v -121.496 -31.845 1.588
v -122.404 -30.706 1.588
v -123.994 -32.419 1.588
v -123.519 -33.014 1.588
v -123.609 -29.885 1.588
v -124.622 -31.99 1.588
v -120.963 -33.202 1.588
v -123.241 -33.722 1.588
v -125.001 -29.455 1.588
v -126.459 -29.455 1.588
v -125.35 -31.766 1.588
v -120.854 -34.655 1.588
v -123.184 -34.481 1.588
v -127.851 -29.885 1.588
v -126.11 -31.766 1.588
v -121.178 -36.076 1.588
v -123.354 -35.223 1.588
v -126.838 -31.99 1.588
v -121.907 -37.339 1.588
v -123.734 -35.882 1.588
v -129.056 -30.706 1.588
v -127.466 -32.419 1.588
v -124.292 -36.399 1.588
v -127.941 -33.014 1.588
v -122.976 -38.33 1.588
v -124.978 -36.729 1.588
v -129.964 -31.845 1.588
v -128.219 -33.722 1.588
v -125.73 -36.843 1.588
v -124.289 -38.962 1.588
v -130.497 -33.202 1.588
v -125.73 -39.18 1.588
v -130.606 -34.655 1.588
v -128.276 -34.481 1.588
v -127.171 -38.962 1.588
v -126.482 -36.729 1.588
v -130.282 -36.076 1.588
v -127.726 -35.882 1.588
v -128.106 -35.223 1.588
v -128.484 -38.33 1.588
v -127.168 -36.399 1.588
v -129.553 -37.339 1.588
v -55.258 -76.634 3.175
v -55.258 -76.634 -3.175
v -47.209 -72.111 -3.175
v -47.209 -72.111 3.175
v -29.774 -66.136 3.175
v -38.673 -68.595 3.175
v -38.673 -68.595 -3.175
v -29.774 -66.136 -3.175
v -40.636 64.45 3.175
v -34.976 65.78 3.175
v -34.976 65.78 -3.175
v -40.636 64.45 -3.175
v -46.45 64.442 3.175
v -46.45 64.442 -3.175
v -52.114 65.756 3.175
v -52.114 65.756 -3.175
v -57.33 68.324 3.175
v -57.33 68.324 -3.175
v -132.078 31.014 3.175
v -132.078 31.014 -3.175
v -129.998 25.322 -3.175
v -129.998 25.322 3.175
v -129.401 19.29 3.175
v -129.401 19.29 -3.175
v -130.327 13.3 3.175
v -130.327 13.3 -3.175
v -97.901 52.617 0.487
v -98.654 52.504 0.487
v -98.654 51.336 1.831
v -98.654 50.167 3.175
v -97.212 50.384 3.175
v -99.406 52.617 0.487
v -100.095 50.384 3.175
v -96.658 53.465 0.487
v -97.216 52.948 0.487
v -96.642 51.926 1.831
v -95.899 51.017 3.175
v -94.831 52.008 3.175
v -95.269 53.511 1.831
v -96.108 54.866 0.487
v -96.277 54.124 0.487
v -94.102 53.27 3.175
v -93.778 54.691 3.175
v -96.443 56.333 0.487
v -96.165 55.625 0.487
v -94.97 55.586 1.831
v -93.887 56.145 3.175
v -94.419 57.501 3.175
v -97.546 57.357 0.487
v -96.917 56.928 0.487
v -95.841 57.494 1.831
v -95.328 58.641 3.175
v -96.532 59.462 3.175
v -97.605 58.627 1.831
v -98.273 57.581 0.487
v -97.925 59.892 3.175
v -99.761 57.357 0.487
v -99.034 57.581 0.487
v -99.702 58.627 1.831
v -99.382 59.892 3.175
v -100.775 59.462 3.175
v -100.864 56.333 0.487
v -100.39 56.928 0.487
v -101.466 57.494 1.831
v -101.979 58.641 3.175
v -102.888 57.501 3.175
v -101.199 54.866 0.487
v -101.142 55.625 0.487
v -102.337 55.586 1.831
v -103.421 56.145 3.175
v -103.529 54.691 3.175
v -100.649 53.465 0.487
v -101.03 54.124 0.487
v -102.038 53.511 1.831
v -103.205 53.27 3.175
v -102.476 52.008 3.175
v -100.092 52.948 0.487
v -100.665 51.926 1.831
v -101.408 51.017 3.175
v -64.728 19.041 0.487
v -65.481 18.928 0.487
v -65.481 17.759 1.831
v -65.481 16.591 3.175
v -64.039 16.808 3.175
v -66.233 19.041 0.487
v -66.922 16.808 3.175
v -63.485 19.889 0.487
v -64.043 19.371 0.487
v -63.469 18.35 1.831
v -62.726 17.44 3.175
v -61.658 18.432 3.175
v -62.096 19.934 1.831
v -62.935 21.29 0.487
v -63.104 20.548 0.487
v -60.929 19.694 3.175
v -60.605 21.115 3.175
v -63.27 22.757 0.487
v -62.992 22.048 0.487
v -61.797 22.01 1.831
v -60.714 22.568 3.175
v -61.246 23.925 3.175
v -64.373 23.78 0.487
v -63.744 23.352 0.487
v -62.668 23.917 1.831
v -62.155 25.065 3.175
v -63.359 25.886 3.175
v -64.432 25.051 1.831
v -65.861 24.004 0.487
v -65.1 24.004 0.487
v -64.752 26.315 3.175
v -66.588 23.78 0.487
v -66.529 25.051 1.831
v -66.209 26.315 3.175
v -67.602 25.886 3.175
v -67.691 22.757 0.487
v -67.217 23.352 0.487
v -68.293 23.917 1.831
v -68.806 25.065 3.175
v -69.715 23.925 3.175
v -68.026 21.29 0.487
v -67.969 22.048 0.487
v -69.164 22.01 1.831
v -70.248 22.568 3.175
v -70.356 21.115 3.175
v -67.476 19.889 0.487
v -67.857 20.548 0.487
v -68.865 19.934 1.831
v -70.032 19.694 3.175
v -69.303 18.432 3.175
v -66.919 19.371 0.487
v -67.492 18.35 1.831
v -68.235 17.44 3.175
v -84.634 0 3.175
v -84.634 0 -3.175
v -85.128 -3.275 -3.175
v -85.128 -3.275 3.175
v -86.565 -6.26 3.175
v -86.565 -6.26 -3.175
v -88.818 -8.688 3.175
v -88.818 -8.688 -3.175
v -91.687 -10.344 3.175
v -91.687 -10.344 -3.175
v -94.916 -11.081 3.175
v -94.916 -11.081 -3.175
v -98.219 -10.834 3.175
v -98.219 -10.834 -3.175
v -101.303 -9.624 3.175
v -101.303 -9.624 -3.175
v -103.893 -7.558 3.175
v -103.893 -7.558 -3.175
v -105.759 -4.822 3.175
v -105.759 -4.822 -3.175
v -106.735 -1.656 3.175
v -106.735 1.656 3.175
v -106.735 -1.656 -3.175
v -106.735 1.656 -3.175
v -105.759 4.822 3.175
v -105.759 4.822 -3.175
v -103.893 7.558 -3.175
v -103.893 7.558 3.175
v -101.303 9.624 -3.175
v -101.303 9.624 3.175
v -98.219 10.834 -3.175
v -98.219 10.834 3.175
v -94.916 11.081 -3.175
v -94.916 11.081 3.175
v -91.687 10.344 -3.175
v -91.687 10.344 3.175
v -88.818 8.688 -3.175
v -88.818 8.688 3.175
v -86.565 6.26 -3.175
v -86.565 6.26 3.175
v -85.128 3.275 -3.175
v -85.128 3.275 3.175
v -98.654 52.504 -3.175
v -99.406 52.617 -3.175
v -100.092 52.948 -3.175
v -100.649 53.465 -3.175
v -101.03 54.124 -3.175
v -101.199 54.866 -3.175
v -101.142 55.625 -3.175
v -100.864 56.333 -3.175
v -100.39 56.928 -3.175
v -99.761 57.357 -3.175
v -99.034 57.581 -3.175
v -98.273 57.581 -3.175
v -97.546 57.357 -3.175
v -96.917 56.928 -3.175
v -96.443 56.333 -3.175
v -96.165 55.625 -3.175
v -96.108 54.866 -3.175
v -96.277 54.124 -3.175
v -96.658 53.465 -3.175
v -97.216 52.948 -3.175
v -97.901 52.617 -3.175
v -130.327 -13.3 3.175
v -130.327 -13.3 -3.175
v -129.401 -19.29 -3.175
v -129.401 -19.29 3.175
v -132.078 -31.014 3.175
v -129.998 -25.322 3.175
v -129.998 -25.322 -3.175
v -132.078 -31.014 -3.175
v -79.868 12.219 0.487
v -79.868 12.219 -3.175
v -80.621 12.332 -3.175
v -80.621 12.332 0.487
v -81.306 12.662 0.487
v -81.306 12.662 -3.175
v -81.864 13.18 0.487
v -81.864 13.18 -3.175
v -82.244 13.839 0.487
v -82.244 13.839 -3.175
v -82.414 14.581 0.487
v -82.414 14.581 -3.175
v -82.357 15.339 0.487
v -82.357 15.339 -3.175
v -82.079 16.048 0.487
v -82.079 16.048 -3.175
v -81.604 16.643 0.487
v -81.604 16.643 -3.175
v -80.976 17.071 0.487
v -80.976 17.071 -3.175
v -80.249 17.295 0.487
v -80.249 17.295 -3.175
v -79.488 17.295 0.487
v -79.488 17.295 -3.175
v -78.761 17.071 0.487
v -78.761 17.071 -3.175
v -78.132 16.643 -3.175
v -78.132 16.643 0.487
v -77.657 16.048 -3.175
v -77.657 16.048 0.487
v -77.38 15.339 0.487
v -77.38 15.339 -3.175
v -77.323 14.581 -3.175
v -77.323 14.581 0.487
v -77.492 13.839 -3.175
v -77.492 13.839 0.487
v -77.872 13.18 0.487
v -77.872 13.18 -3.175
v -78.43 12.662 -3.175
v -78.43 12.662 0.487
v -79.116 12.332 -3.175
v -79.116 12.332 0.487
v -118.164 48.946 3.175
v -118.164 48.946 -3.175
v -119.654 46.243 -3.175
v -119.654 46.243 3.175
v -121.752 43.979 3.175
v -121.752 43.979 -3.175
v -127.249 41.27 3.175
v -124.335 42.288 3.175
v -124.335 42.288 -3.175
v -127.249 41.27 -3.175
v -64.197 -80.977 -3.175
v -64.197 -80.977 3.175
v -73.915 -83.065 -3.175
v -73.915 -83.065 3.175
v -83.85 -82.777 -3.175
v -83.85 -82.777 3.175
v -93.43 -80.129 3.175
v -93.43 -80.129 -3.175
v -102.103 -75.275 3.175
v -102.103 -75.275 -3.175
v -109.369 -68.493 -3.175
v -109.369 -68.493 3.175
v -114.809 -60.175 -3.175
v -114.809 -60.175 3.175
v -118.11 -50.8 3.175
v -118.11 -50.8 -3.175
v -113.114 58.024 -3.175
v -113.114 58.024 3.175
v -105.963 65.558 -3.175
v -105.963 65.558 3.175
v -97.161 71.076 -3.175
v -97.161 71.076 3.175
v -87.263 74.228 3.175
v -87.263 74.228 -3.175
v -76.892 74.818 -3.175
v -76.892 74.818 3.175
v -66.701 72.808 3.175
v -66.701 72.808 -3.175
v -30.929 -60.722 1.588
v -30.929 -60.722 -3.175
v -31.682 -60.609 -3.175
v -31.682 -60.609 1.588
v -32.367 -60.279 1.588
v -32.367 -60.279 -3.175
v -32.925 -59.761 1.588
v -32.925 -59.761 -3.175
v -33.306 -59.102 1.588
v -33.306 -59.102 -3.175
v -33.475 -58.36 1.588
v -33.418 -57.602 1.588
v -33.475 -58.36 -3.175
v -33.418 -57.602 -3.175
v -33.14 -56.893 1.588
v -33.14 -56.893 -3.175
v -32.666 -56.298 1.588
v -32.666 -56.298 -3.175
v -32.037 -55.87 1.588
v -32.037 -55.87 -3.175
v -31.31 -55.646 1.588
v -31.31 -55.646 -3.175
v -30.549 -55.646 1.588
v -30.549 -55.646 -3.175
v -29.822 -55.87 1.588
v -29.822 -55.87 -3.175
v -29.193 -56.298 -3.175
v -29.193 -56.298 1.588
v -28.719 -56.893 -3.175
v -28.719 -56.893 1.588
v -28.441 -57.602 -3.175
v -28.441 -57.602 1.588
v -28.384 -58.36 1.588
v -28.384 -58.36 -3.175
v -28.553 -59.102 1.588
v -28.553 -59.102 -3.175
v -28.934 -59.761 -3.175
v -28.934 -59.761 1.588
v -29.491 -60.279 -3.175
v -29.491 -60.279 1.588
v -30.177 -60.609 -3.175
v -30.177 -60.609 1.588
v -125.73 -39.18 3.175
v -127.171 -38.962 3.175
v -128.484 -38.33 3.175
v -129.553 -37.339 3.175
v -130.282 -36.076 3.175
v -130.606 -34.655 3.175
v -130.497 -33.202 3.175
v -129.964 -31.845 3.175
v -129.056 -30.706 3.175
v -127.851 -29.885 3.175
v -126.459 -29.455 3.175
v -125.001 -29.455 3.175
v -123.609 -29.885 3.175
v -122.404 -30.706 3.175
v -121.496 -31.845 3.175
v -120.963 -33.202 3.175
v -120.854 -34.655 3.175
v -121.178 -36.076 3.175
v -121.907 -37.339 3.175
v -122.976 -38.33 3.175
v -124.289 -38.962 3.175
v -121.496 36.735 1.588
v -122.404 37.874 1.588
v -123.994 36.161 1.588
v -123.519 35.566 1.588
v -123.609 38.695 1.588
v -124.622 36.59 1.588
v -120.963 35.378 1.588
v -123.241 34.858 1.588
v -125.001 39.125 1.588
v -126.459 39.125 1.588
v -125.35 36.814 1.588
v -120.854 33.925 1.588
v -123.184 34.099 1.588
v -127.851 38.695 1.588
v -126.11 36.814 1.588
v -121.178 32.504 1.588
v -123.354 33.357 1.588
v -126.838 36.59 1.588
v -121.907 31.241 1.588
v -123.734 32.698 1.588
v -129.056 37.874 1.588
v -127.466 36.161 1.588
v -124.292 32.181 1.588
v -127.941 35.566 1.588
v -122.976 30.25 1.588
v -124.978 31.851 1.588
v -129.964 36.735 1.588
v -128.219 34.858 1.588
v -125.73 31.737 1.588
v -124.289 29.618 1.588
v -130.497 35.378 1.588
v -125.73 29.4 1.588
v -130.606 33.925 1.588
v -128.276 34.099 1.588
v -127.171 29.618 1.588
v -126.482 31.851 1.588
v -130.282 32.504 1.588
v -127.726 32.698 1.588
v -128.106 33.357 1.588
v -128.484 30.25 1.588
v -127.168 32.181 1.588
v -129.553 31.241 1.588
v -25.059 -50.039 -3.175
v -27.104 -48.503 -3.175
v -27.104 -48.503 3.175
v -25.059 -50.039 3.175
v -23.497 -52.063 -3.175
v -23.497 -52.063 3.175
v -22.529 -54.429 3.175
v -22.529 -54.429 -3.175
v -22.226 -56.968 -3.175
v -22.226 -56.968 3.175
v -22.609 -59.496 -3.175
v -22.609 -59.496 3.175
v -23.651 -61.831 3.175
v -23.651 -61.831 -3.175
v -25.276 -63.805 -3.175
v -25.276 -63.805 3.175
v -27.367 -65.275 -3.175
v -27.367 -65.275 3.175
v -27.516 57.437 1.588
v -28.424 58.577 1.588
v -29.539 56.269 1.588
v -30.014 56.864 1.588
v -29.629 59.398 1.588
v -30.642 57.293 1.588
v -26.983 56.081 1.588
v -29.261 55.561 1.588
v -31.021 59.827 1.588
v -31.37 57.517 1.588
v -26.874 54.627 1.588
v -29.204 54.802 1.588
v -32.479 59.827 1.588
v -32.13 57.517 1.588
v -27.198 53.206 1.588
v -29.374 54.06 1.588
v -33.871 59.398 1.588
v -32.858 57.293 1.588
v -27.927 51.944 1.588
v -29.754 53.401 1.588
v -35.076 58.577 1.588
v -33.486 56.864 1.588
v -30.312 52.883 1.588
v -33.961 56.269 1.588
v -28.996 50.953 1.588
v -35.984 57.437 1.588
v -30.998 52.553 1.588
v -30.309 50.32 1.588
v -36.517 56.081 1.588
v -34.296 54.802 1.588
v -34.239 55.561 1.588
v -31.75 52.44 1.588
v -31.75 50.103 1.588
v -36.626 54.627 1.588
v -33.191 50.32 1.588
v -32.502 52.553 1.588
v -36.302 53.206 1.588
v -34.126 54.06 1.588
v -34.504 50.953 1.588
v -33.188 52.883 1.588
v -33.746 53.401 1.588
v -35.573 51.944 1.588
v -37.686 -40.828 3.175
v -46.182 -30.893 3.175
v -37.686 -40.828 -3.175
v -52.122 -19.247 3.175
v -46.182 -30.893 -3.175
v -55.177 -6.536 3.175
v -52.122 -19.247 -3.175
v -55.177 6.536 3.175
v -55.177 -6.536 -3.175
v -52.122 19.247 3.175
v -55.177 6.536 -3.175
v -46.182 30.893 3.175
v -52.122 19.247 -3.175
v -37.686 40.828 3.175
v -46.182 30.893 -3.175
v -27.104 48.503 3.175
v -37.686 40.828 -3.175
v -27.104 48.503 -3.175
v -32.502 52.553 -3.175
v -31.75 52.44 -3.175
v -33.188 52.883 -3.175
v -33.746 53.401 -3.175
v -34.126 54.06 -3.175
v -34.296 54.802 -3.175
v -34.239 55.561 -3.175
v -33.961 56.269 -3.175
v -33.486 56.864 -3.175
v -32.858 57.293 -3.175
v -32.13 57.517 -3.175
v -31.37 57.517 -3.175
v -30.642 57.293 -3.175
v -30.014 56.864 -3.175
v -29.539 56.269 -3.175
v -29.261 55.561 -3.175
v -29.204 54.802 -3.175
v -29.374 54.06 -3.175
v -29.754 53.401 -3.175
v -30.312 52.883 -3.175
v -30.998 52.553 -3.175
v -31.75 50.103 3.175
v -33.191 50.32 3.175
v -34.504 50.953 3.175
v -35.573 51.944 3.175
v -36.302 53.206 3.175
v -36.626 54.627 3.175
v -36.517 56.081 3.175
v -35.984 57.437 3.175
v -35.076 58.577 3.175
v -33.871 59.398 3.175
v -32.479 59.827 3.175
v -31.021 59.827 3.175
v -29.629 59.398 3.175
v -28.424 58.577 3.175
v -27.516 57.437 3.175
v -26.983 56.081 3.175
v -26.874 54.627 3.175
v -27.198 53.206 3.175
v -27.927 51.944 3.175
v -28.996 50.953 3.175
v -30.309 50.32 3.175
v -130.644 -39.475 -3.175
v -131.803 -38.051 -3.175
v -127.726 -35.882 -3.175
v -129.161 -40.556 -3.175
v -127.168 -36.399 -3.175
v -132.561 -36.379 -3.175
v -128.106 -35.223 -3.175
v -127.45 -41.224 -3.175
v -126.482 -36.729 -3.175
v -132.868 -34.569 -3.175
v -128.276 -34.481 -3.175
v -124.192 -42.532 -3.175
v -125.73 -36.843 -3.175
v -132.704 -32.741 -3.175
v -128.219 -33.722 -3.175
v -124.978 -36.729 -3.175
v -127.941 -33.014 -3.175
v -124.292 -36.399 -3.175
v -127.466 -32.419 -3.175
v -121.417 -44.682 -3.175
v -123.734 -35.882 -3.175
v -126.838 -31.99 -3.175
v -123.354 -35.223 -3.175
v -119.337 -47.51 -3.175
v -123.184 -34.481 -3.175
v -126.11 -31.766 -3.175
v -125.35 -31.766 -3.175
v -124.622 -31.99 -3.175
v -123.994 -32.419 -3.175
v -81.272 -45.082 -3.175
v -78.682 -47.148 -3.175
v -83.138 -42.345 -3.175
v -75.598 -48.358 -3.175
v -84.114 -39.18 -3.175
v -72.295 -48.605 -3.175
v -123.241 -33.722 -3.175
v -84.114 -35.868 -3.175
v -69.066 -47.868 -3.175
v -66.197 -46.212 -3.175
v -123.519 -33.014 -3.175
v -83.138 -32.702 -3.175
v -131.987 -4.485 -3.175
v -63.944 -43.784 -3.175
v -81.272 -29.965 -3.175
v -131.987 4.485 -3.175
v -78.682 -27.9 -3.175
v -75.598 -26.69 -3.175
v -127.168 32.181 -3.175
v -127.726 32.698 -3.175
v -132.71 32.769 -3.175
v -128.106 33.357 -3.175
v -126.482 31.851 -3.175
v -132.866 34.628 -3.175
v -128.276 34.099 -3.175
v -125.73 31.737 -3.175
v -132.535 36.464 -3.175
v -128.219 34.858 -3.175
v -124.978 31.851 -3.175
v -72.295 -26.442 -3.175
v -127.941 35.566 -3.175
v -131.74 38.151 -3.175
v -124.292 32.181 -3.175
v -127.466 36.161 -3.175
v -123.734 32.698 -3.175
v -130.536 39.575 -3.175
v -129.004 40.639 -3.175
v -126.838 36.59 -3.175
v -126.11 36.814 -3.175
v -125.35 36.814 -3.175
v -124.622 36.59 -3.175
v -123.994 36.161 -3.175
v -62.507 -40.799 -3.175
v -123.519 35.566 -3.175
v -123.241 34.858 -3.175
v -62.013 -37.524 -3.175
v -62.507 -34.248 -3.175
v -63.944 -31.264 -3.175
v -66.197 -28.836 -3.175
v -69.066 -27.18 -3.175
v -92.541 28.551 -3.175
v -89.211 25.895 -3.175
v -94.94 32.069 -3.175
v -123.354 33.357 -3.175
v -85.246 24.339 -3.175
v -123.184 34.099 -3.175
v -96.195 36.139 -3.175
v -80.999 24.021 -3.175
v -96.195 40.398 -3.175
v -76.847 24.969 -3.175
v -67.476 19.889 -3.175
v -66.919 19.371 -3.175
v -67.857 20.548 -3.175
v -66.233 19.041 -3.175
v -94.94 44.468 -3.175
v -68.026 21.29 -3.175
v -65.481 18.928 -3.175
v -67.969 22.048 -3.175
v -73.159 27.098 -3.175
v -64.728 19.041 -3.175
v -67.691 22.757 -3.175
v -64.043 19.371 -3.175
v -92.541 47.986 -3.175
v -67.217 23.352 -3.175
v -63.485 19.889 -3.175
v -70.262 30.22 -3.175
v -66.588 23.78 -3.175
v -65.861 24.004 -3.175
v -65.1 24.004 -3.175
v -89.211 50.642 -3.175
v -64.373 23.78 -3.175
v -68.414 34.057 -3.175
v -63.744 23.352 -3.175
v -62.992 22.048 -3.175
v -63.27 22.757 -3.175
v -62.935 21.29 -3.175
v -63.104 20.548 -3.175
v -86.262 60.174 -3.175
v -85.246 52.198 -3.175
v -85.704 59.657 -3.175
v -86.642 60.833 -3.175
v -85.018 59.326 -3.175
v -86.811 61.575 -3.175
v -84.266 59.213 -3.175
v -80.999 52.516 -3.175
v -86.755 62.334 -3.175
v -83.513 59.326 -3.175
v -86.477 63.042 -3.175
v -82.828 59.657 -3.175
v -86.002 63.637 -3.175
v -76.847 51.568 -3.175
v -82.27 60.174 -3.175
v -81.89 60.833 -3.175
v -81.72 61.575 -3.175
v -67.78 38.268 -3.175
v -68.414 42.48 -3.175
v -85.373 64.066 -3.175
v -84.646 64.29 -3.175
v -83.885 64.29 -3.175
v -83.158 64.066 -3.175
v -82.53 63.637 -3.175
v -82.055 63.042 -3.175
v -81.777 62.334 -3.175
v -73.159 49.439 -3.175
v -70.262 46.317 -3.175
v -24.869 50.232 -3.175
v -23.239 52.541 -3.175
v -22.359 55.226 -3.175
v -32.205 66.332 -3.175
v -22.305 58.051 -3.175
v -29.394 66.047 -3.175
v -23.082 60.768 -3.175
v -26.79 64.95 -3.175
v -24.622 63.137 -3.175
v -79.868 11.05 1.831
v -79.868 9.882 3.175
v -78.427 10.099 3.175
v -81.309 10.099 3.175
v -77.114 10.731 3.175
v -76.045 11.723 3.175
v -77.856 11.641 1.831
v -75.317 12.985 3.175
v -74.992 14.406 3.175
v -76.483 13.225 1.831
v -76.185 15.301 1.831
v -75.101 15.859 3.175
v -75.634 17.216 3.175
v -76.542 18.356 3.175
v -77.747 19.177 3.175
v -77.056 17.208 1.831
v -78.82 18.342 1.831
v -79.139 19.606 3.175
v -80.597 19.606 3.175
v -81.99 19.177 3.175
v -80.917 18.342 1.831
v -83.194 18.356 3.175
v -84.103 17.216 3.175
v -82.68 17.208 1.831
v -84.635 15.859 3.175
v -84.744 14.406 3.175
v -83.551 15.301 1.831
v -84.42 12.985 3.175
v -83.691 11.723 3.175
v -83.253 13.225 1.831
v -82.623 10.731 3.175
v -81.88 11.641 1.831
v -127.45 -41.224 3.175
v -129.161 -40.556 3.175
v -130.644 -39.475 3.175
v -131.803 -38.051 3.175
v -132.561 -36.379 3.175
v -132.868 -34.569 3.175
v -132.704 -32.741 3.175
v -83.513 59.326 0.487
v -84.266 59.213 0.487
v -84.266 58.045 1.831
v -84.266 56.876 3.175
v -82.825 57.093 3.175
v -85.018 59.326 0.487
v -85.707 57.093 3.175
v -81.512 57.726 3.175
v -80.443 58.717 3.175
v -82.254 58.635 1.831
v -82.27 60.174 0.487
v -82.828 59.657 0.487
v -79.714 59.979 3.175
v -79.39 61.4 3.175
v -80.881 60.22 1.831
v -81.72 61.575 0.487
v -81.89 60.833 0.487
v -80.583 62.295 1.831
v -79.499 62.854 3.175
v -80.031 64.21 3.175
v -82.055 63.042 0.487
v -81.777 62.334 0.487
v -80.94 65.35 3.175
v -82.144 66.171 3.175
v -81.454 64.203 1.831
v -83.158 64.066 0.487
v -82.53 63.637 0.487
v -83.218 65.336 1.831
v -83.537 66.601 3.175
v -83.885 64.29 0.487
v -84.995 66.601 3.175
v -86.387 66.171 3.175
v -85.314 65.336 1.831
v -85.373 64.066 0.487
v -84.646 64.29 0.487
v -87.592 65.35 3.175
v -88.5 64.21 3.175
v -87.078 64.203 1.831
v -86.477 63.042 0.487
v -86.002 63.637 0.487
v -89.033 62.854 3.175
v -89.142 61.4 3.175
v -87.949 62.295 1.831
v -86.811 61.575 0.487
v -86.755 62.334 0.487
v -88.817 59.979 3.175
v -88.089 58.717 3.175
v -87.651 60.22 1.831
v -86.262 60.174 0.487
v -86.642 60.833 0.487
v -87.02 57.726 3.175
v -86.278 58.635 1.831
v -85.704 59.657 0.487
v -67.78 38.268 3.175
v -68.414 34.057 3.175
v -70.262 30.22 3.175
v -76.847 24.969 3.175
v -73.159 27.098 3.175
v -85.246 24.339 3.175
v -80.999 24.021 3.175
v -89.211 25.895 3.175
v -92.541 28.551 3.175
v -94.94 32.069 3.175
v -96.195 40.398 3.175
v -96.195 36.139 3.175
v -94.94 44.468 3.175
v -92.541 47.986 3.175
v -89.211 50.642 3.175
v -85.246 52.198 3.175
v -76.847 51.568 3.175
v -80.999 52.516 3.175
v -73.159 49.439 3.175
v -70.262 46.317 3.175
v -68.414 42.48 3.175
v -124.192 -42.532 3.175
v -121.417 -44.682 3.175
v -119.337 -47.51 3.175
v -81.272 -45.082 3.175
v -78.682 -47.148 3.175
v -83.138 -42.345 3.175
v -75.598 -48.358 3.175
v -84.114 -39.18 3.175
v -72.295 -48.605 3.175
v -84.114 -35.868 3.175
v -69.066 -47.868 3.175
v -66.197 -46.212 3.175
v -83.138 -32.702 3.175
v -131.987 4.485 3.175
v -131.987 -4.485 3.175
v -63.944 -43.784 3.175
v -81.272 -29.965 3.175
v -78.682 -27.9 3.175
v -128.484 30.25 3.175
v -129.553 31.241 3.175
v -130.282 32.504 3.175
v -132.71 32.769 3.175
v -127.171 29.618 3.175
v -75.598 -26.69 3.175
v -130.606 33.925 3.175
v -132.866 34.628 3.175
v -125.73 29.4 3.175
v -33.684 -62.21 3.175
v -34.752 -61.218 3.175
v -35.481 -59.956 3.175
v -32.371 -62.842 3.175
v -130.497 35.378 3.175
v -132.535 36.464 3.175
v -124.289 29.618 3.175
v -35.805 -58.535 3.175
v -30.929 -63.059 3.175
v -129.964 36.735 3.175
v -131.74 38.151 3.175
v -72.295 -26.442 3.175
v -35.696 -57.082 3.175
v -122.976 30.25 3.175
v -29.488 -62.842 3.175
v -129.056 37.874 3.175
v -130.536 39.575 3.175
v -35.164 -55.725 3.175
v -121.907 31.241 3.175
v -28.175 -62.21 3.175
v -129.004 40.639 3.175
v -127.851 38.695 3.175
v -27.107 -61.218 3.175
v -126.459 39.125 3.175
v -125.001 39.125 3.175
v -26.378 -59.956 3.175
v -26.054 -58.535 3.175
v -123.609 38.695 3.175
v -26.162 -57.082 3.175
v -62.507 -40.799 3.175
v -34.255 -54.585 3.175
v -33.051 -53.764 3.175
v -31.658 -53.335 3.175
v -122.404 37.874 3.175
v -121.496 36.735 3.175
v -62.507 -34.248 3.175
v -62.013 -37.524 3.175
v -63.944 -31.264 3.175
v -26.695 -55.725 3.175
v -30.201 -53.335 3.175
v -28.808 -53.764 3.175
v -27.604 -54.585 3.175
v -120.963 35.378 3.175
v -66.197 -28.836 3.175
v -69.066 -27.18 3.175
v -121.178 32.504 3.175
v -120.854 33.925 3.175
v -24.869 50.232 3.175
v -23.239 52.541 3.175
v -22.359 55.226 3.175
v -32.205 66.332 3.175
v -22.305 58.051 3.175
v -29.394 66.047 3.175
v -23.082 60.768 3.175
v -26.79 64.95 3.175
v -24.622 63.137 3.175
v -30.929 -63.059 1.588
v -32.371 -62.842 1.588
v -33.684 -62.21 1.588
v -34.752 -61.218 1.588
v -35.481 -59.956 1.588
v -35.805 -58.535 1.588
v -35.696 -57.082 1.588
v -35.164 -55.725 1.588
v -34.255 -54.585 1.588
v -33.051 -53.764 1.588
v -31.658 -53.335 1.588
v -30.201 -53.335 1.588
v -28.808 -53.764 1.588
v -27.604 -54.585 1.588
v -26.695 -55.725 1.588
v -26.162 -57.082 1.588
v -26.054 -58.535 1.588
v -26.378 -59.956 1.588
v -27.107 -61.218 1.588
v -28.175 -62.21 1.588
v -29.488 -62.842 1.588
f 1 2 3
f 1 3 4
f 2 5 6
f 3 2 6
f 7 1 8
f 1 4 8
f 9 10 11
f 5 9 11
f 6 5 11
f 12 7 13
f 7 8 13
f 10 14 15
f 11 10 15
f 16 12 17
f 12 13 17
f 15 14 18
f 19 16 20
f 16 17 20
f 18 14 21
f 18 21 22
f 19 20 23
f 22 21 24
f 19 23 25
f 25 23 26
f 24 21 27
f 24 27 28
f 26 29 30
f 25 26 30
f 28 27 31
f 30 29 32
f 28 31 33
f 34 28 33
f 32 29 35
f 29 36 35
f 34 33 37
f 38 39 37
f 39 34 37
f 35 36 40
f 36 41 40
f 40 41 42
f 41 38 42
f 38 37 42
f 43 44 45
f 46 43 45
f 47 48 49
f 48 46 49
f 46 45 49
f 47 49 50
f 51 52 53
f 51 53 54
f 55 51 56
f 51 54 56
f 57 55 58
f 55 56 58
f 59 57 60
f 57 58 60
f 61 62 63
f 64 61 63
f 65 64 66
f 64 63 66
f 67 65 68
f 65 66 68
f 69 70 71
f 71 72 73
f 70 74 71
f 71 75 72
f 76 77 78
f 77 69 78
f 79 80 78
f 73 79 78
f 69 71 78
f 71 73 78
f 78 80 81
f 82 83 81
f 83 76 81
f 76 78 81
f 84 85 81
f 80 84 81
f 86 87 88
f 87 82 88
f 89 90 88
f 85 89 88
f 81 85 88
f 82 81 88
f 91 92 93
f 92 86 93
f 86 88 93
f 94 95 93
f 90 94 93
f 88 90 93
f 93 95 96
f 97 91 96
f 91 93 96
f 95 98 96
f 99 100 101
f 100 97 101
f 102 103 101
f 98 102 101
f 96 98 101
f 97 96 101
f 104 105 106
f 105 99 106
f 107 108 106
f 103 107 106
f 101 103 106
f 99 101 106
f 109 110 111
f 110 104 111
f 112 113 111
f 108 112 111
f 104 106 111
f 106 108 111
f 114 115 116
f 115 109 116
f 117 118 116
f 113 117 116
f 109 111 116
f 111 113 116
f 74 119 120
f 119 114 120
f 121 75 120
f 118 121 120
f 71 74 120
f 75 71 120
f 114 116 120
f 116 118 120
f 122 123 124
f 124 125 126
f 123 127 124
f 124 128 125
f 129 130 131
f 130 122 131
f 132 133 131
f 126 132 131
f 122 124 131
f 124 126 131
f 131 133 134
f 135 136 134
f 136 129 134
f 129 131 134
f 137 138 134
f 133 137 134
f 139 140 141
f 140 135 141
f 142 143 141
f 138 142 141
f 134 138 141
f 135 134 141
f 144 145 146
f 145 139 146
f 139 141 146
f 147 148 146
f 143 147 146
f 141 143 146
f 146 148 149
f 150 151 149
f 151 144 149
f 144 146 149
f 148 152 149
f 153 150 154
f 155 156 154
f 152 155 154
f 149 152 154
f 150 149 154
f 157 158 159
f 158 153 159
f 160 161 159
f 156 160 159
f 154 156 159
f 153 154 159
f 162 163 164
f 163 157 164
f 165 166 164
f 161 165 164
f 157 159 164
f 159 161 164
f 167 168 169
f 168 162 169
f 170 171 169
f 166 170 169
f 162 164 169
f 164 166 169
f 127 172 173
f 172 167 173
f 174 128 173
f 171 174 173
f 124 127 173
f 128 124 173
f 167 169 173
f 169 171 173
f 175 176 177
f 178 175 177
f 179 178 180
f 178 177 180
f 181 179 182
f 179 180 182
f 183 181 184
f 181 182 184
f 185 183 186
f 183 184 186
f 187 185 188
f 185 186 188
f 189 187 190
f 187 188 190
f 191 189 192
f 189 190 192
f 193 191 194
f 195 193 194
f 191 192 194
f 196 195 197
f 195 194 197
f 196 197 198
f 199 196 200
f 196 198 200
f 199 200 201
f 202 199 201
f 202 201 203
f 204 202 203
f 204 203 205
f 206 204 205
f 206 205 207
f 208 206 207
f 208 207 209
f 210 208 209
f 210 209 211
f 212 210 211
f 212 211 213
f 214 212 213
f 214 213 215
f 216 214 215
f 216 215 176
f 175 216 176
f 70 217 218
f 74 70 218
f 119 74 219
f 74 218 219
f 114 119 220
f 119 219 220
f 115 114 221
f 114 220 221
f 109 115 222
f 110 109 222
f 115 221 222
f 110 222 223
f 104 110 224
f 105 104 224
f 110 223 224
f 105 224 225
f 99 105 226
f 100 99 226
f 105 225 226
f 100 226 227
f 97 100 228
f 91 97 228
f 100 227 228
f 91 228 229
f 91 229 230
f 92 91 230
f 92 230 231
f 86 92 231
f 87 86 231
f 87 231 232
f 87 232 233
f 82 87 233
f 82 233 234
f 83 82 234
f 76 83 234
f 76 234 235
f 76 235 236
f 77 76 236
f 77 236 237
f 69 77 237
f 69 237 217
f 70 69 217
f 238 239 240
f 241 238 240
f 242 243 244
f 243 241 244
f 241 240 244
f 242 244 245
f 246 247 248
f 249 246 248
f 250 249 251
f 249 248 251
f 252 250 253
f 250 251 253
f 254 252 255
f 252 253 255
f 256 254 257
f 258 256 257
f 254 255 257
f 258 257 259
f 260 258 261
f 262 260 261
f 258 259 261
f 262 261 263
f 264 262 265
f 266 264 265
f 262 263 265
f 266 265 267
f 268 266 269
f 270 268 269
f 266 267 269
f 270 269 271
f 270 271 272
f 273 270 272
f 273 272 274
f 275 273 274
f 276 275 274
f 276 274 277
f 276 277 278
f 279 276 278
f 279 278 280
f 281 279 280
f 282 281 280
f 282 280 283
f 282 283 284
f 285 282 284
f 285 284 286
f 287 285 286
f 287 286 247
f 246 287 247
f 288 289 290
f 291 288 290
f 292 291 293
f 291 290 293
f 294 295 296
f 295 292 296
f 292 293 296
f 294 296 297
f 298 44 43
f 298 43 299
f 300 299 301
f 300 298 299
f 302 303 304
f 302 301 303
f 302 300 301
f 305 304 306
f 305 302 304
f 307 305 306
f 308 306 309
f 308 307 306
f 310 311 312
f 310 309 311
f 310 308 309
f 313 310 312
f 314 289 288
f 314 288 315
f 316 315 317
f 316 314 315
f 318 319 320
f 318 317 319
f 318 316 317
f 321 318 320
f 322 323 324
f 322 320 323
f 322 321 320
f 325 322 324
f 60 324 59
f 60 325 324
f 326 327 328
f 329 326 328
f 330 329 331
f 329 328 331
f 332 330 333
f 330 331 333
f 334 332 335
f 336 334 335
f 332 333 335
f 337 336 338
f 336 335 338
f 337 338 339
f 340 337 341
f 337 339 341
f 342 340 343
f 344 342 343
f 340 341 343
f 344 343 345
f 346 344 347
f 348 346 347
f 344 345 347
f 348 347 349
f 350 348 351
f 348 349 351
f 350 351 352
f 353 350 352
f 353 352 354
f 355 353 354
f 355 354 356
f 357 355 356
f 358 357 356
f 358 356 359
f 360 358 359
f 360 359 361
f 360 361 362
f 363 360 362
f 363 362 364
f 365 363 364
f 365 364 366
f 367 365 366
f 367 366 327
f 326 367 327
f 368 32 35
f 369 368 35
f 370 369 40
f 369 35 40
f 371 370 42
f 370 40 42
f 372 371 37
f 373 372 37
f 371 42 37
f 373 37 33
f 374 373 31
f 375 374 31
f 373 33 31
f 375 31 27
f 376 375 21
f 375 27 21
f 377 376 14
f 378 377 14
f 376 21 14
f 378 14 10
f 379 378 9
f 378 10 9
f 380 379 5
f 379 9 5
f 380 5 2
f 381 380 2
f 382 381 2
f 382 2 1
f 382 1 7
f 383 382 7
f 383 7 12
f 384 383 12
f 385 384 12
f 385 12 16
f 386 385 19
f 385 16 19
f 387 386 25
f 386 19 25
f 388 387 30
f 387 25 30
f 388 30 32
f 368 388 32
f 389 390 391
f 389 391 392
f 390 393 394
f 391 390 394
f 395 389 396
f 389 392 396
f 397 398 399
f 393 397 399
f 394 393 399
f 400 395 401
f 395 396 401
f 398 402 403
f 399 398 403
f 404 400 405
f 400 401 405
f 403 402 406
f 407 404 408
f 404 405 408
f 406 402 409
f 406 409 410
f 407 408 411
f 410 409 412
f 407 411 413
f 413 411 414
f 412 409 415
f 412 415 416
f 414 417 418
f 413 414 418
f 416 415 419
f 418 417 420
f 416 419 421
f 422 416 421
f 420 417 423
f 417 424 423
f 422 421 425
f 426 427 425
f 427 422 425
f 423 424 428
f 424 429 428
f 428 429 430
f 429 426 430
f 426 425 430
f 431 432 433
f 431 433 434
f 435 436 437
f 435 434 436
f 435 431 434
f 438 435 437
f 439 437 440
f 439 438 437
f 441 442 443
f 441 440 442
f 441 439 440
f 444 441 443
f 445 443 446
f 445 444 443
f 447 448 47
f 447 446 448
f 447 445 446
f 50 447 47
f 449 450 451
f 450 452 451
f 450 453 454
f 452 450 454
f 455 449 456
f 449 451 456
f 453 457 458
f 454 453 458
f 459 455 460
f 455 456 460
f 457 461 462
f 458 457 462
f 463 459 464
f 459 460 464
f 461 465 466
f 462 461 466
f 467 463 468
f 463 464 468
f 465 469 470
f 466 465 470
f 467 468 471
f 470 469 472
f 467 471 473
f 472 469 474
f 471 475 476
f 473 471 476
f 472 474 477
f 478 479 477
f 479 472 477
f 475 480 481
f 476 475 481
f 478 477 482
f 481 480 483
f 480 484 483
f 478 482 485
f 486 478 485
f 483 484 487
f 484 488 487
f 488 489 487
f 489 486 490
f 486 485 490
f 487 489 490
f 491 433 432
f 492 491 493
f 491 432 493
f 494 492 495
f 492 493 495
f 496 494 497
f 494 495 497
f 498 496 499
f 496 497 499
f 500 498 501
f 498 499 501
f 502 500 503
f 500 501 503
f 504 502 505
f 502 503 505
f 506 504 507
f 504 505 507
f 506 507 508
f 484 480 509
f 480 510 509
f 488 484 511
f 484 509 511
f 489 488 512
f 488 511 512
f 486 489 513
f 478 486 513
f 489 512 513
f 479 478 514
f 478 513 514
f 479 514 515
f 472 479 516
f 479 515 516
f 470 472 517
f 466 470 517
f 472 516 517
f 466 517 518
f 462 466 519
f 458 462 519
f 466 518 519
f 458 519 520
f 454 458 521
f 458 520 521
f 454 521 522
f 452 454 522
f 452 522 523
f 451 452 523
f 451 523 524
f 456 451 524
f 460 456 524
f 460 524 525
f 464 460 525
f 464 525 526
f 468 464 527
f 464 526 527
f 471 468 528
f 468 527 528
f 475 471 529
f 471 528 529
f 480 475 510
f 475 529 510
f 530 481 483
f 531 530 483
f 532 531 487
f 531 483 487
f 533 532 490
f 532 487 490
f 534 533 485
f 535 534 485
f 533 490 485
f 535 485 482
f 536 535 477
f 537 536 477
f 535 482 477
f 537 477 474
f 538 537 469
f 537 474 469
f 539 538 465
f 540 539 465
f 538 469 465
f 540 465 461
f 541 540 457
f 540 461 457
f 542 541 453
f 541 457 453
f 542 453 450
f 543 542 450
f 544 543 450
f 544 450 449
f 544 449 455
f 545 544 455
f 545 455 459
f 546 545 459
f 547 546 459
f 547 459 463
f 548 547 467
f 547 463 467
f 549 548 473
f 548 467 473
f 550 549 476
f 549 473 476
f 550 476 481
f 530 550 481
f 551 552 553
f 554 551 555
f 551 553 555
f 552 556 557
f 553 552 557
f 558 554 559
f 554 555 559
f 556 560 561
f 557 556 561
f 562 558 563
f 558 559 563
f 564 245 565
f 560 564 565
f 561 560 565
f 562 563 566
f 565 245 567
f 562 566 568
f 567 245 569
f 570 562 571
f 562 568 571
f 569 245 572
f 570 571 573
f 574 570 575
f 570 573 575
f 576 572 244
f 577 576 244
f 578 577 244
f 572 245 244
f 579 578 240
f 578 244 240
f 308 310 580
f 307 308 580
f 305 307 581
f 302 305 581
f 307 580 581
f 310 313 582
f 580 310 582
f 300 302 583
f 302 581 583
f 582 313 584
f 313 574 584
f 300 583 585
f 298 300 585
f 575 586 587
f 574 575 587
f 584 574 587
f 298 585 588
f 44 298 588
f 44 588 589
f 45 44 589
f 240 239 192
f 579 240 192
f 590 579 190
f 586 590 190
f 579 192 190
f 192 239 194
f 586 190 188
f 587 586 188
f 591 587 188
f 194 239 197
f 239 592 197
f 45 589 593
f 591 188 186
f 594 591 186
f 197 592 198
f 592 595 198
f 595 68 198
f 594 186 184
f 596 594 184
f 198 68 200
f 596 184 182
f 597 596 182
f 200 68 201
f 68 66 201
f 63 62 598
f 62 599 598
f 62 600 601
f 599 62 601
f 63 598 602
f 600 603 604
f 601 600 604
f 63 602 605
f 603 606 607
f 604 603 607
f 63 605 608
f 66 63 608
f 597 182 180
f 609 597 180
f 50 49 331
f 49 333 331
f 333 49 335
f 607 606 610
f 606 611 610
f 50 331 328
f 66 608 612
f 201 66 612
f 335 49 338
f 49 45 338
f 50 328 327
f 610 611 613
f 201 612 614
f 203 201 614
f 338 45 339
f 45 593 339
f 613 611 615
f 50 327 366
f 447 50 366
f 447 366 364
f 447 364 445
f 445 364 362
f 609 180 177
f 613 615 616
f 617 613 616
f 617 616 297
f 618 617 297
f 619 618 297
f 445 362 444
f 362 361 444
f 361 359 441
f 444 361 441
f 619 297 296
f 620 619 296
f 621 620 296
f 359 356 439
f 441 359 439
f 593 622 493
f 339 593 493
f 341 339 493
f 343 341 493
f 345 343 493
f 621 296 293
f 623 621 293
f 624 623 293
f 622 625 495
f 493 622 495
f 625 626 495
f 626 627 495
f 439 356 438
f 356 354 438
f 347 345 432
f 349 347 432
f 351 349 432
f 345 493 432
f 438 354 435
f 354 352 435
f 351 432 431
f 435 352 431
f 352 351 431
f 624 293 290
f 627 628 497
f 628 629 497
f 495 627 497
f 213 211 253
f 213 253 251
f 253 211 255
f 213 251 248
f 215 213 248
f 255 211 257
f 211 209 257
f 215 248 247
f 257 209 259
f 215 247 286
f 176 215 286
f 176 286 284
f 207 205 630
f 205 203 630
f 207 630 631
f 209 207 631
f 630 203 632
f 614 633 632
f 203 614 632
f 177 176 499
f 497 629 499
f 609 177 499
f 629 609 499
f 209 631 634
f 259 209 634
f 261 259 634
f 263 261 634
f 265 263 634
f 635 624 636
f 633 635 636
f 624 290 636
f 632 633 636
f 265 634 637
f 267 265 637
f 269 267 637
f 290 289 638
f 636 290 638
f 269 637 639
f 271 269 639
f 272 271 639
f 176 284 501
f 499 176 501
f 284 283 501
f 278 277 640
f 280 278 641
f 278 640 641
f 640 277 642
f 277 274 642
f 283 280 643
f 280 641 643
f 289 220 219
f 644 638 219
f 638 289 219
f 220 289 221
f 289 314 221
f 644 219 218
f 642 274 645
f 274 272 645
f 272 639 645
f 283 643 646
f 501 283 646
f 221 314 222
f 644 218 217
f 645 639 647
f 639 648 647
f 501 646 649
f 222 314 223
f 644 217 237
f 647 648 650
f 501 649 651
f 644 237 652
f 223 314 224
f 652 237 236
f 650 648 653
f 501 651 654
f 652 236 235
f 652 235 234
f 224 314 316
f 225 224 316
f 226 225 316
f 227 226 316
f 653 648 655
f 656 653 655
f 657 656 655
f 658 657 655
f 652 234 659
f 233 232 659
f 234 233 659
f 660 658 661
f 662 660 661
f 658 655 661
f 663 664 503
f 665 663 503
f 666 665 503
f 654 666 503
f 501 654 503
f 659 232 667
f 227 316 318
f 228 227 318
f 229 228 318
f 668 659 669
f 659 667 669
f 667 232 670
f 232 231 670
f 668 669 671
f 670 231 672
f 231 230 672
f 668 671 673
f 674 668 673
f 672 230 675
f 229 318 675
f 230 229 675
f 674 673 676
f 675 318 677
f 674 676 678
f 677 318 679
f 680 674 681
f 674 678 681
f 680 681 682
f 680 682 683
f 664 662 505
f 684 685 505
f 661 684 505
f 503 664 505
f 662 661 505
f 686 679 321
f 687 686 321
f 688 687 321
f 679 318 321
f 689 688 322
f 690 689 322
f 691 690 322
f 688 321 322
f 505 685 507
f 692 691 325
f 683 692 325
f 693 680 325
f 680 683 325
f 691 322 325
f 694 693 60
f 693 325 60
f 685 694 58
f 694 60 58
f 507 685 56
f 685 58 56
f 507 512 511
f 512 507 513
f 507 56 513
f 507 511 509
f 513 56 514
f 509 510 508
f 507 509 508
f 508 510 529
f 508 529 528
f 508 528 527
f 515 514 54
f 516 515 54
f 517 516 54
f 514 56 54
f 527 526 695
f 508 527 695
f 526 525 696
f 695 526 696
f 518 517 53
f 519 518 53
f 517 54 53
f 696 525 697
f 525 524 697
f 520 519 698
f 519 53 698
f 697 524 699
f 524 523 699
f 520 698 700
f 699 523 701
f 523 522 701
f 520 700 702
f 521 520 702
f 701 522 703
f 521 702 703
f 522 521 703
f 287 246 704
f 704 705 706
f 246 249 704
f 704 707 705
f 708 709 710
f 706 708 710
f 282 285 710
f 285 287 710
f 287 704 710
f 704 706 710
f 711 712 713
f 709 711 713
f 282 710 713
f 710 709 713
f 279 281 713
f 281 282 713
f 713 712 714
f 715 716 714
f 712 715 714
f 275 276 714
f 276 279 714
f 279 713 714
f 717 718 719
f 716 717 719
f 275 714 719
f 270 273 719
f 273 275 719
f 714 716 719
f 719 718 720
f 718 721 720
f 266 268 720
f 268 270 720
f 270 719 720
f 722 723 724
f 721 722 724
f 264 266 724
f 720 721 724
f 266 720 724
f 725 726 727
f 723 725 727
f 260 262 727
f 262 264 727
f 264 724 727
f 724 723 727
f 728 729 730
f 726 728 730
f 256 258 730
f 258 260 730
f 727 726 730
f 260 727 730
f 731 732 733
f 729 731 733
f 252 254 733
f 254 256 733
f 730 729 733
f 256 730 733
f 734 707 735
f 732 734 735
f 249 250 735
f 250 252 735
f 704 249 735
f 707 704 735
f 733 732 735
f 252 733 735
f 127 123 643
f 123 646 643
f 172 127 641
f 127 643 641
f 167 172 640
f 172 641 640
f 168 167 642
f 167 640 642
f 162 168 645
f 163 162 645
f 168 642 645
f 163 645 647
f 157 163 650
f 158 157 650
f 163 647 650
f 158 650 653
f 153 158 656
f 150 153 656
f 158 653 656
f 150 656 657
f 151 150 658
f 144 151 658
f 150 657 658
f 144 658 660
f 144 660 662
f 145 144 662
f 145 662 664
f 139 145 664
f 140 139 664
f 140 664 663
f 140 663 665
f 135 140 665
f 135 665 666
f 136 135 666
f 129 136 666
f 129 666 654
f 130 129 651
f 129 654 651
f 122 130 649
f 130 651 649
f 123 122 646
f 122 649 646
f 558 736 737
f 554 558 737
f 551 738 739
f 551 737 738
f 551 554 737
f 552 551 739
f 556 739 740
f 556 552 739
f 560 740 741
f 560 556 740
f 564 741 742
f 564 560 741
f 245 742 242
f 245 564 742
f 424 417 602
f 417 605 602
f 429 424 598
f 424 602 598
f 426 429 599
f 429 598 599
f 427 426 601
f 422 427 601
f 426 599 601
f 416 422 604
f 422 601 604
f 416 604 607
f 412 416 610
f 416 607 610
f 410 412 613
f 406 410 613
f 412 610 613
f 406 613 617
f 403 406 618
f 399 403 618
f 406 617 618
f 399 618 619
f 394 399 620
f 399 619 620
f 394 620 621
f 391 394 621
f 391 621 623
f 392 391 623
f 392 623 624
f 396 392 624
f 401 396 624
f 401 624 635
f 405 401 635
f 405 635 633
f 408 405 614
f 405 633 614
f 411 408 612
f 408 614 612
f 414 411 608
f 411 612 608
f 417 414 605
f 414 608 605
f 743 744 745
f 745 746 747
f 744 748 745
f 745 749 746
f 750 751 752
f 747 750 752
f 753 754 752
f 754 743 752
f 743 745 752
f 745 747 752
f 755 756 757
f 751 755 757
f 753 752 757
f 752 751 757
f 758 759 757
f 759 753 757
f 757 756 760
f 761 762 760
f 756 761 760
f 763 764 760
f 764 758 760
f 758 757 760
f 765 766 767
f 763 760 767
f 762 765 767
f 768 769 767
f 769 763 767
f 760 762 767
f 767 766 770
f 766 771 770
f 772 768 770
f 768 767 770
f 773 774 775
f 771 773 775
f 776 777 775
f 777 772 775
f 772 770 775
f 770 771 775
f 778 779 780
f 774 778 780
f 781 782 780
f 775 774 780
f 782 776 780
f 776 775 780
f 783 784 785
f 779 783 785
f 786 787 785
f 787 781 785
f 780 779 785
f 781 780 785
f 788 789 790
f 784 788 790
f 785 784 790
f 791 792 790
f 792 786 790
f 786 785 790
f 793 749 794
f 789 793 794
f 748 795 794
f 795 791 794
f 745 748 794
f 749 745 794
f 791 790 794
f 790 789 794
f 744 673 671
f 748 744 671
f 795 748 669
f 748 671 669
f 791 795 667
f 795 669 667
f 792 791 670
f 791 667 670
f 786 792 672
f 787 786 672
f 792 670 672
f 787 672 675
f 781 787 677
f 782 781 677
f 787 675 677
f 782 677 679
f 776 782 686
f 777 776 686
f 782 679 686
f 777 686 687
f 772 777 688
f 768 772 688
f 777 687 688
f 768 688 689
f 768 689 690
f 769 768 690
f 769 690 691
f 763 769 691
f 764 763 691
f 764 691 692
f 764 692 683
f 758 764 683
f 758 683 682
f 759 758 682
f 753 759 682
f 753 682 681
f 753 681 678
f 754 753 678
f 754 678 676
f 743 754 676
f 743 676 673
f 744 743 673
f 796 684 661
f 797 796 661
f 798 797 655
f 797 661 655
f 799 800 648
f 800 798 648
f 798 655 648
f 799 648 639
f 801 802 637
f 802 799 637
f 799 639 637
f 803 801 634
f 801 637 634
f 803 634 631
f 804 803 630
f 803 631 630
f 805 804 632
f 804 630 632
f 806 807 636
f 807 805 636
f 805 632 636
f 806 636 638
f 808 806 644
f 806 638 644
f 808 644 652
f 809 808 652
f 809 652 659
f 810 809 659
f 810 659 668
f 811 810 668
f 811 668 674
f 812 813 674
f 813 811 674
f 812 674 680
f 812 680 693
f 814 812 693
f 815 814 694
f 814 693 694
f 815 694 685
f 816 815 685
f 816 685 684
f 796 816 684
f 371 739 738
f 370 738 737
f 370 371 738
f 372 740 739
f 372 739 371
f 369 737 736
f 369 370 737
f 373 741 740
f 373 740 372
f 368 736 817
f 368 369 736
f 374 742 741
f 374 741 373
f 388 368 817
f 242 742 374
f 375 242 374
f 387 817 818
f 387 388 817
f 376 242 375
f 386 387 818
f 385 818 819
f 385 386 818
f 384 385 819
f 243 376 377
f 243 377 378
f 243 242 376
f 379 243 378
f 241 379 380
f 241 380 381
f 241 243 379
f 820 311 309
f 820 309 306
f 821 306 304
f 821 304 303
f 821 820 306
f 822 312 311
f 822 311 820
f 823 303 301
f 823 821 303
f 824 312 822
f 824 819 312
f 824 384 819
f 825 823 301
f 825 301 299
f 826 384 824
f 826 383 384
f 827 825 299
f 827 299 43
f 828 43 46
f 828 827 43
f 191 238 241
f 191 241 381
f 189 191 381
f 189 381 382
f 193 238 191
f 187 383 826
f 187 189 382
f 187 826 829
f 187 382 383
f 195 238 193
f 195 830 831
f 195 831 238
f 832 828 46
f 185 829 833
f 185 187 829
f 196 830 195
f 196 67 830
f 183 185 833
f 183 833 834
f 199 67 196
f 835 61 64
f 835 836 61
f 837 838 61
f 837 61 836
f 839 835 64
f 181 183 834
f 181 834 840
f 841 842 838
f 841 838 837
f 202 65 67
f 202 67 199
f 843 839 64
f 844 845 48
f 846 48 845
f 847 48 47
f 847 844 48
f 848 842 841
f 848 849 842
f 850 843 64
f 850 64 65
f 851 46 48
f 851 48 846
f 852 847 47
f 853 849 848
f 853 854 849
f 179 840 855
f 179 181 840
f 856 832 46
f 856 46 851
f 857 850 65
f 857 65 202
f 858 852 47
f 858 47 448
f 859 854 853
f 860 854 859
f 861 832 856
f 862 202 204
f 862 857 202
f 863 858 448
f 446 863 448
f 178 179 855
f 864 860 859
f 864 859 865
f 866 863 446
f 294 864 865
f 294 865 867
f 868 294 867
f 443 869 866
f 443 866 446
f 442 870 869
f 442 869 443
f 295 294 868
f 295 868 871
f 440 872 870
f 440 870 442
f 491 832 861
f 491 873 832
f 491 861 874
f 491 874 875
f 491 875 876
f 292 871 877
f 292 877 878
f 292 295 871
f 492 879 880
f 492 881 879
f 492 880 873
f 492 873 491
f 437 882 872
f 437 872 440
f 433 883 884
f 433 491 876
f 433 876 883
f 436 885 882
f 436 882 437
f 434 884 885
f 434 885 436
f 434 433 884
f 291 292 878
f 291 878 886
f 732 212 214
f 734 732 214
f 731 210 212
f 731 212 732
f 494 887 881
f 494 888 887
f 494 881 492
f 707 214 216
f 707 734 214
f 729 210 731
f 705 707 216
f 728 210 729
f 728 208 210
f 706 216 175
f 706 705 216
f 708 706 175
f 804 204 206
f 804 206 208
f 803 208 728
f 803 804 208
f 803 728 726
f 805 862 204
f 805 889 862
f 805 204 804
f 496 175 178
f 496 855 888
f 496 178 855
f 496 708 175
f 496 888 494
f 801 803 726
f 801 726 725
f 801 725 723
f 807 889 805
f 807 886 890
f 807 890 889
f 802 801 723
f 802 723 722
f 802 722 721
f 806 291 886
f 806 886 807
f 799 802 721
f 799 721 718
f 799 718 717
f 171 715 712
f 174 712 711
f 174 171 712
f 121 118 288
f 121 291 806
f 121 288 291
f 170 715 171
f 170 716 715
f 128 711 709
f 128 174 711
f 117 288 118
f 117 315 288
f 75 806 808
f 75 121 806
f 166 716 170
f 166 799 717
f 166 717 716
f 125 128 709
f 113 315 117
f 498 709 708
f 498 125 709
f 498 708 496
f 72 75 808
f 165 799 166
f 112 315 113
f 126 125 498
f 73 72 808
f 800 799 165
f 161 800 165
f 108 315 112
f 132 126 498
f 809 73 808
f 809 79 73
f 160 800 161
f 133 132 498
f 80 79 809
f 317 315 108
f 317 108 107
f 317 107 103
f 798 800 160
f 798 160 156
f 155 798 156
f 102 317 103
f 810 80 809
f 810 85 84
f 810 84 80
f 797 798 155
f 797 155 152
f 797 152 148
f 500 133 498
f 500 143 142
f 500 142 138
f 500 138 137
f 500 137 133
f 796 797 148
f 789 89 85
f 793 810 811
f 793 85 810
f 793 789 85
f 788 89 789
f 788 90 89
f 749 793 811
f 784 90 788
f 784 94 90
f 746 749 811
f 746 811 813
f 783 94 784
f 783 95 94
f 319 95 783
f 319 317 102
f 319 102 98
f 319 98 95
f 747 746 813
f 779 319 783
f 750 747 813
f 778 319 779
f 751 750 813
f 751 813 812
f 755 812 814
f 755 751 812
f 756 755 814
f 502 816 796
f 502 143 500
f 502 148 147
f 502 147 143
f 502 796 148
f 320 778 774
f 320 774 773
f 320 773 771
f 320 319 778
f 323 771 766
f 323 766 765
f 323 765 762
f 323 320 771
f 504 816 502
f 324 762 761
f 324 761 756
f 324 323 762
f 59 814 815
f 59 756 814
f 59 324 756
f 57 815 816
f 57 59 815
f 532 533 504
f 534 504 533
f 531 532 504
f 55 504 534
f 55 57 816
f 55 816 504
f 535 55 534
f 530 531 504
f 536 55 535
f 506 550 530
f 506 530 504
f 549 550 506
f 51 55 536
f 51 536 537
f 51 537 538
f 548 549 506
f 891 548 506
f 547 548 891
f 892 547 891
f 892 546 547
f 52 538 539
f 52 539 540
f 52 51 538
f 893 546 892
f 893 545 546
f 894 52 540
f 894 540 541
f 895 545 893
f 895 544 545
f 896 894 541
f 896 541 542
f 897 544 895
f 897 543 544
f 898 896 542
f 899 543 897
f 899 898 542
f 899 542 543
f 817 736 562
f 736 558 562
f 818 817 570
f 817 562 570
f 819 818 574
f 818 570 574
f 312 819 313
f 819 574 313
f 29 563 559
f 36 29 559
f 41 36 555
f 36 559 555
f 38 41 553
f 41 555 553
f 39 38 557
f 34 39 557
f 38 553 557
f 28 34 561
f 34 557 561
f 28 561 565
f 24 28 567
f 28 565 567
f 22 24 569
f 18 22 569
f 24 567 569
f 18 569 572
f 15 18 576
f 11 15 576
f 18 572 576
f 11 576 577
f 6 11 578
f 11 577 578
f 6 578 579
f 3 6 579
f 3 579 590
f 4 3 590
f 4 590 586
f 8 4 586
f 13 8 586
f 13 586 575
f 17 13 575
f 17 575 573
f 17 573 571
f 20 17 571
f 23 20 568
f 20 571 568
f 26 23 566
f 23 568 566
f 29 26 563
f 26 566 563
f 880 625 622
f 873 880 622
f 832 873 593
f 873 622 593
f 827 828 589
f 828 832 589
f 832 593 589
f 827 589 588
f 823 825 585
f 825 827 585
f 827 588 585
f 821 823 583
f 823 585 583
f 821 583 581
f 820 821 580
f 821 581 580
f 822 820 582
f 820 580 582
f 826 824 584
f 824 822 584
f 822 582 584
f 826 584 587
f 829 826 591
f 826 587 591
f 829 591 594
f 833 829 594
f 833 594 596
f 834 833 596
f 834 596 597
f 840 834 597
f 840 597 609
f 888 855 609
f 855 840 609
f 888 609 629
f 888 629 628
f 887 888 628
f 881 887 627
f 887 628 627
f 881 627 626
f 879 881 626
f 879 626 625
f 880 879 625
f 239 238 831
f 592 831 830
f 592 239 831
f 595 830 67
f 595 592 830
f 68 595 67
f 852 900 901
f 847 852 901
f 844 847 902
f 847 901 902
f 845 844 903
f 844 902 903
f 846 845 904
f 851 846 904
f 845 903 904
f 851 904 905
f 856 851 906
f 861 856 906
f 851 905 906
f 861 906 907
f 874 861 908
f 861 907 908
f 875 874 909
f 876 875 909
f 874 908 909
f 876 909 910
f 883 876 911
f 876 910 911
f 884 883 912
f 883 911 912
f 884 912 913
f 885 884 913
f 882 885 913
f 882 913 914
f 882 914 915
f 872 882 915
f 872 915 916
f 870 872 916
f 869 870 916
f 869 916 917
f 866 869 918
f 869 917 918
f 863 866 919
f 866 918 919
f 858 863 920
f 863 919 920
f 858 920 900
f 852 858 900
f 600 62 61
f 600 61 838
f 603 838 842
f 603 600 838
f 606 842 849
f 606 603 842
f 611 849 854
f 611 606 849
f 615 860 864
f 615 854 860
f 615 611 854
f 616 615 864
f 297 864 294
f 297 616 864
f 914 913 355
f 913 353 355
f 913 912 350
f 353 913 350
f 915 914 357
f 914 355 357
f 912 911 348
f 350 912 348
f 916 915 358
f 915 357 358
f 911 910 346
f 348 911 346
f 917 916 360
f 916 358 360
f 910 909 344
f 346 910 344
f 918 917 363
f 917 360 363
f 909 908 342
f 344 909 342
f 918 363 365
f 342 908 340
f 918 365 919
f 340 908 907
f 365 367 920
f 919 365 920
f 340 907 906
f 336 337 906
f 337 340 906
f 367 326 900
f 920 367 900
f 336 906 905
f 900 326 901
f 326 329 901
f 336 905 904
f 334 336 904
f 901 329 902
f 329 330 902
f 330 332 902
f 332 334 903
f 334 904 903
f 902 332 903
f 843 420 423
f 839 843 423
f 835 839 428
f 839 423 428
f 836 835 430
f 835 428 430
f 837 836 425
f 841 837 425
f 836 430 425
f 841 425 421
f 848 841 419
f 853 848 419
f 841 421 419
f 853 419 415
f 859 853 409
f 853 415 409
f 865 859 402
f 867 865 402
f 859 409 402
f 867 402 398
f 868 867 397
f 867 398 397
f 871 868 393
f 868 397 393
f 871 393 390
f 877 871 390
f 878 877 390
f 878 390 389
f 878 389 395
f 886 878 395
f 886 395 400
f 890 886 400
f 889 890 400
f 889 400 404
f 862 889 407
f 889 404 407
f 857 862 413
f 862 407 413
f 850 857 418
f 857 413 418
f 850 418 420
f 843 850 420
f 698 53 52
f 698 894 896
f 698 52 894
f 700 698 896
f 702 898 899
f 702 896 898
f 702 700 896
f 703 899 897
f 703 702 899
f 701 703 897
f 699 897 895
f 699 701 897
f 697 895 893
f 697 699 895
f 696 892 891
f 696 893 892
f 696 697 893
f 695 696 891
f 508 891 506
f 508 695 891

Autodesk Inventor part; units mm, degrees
ref_plane "YZ Plane" through (0, 0, 0) normal (1, 0, 0) x (0, 1, 0)
ref_plane "XZ Plane" through (0, 0, 0) normal (0, 1, 0) x (-1, 0, 0)
ref_plane "XY Plane" through (0, 0, 0) normal (0, 0, 1) x (1, 0, 0)
sketch "Sketch1" plane through (0, 0, 0) normal (0, 0, 1) x (1, 0, 0)
  circle A0 centre (0, 0) radius 53.975 construction
  circle A1 centre (-95.7467, 0) radius 11.1125
  circle A2 centre (-73.1257, -37.5239) radius 11.1125
  line L0 (-195.0218, 0) -> (95.4745, 0) projected
  line L1 (0, -186.751) -> (0, 135.7508) projected
  circle A3 centre (-82.0671, 38.2685) radius 14.2875
  arc A4 (-27.1037, 48.5034) -> (-27.1037, -48.5034) centre (0, 0) ccw
  arc A5 (-27.1037, 48.5034) -> (-34.976, 65.7804) centre (-31.75, 56.8183) ccw
  circle A6 centre (-95.7467, 0) radius 33.02 construction
  arc A7 (-57.3305, 68.3238) -> (-118.1642, 48.9464) centre (-79.7457, 33.5145) ccw
  arc A8 (-57.3305, 68.3238) -> (-34.976, 65.7804) centre (-43.5788, 89.6792) ccw
  arc A9 (-29.7745, -66.1362) -> (-27.1037, -48.5034) centre (-31.75, -56.8183) ccw
  arc A10 (-118.11, -50.8) -> (-55.2575, -76.6338) centre (-77.6901, -41.8358) ccw
  arc A11 (-29.7745, -66.1362) -> (-55.2575, -76.6338) centre (-13.9704, -140.6793) ccw
  circle A12 centre (-82.0671, 38.2685) radius 33.02 construction
  circle A13 centre (-73.1257, -37.5239) radius 39.37 construction
  circle A14 centre (-95.7467, 0) radius 10.16 construction
  circle A15 centre (0, 0) radius 16.51 construction
  circle A16 centre (-73.1257, -37.5239) radius 16.51 construction
  line L2 (0, 0) -> (-82.0671, 38.2685) construction
  circle A17 centre (-125.73, 34.29) radius 6.35 construction
  circle A18 centre (-125.73, -34.29) radius 6.35 construction
  line L3 (0, 0) -> (-34.976, 65.7804) construction
  line L4 (0, 0) -> (-57.3305, 68.3238) construction
  arc A19 (-127.2489, 41.2704) -> (-132.0785, 31.0144) centre (-125.73, 34.29) ccw
  arc A20 (-130.3268, 13.3001) -> (-130.3268, -13.3001) centre (-83.9357, 0) ccw
  arc A21 (-130.3268, 13.3001) -> (-132.0785, 31.0144) centre (-153.5223, 19.9501) ccw
  arc A22 (-132.0785, -31.0144) -> (-127.4503, -41.2235) centre (-125.73, -34.29) ccw
  arc A23 (-132.0785, -31.0144) -> (-130.3268, -13.3001) centre (-153.5223, -19.9501) ccw
  arc A24 (-118.11, -50.8) -> (-127.4503, -41.2235) centre (-130.5087, -53.5498) ccw
  arc A25 (-127.2489, 41.2704) -> (-118.1642, 48.9464) centre (-129.949, 53.6801) ccw
  line L5 (-118.1642, 48.9464) -> (0, 48.9464) construction
  line L6 (-118.11, -50.8) -> (0, -50.8) construction
  dimension "d0" = 107.95
  dimension "d9" = 22.225
  dimension "d38" = 28.575
  dimension "d63" = 1.5875
  dimension "d66" = 9.525
  dimension "d77" = 31.75
  dimension "d93" = 66.04
  dimension "d95" = 25.4
  dimension "d106" = 66.04
  dimension "d107" = 78.74
  dimension "d108" = 20.32
  dimension "d110" = 33.02
  dimension "d116" = 43.815
  dimension "d117" = 40.64
  dimension "d118" = 33.02
  dimension "d119" = 22.225
  dimension "d120" = 65
  dimension "d121" = 90.551
  dimension "d125" = 12.7
  dimension "d126" = 12.7
  dimension "d128" = 28
  dimension "d129" = 40
  dimension "d130" = 34.29
  dimension "d131" = 125.73
  dimension "d133" = 34.29
  dimension "d134" = 125.73
  dimension "d141" = 14.2875
  dimension "d144" = 14.2875
  dimension "d145" = 11.811
  dimension "d146" = 24.13
  dimension "d147" = 24.13
  dimension "d150" = 48.26
  dimension "d151" = 12.7
  dimension "d152" = 12.7
  dimension "d153" = 41.402
  dimension "d155" = 76.2
  dimension "d156" = 31.75
  dimension "d157" = 9.525
  dimension "d158" = 118.11
  dimension "d159" = 50.8
extrude "Base" add sketch "Sketch1" along normal mid plane 6.35 contours L0 A4 A9 A11 A10 A24 A22 A23 A20 A1 | A1 L0 A20 A21 A19 A25 A7 A8 A5 A4
sketch "Sketch4" plane through (0, 0, 3.175) normal (0, 0, 1) x (1, 0, 0)
  circle A0 centre (-82.0671, 38.2685) radius 14.2875 projected
  line L0 (-98.6536, 55.0567) -> (-84.2659, 61.7657) construction
  line L1 (-79.8682, 14.7713) -> (-65.4806, 21.4803) construction
  line L2 (-155.0035, 0) -> (-0.0953, 0) projected
  line L3 (0, -114.8687) -> (0, 106.5474) projected
  line L4 (-72.6744, 18.1258) -> (-91.4598, 58.4112) construction
  point P0 (-82.0671, 38.2685)
  dimension "d122" = 15.875
  dimension "d123" = 44.45
  dimension "d124" = 25
hole "Encoder Mount Holes" at (-98.6536, 55.0567, 3.175) at (-84.2659, 61.7657, 3.175) at (-79.8682, 14.7713, 3.175) at (-65.4806, 21.4803, 3.175) direction (0, 0, -1) diameter 5.1054 end through all countersink diameter 9.779 countersink angle 82 clearance for "Flat Head Machine Screw (82)" size "#10" standard "Ansi Unified Screw Threads"
sketch "Sketch5" plane through (0, 0, 3.175) normal (0, 0, 1) x (1, 0, 0)
  arc A0 (-27.1037, 48.5034) -> (-27.1037, -48.5034) centre (0, 0) ccw projected
  line L0 (0, 0) -> (-31.75, 54.9926) construction
  line L1 (-159.4485, 0) -> (26.5747, 0) construction
  line L2 (0, -114.8687) -> (0, 106.5474) construction
  line L3 (-30.9294, -58.1697) -> (0, 0) construction
  dimension "d64" = 30
  dimension "d65" = 63.5
  dimension "d100" = 65.8812
  dimension "d102" = 62
hole "Standoff holes to motor plate" at (-31.75, 54.9926, 3.175) at (-30.9294, -58.1697, 3.175) direction (0, 0, -1) diameter 5.1054 end through all counterbore diameter 9.779 counterbore depth 1.5875 clearance for "Flat Head Machine Screw (82)" size "#10" standard "Ansi Unified Screw Threads"
sketch "Sketch7" plane through (0, 0, 3.175) normal (0, 0, 1) x (1, 0, 0)
  arc A0 (-127.2489, 41.2704) -> (-132.0785, 31.0144) centre (-125.73, 34.29) ccw projected
  arc A1 (-132.0785, -31.0144) -> (-127.4503, -41.2235) centre (-125.73, -34.29) ccw projected
hole "Standoff holes to front plate" at (-125.73, 34.29, 3.175) at (-125.73, -34.29, 3.175) direction (0, 0, -1) diameter 5.1054 end through all counterbore diameter 9.779 counterbore depth 1.5875 clearance for "Flat Head Machine Screw (82)" size "#10" standard "Ansi Unified Screw Threads"
properties part number "connected plate"
